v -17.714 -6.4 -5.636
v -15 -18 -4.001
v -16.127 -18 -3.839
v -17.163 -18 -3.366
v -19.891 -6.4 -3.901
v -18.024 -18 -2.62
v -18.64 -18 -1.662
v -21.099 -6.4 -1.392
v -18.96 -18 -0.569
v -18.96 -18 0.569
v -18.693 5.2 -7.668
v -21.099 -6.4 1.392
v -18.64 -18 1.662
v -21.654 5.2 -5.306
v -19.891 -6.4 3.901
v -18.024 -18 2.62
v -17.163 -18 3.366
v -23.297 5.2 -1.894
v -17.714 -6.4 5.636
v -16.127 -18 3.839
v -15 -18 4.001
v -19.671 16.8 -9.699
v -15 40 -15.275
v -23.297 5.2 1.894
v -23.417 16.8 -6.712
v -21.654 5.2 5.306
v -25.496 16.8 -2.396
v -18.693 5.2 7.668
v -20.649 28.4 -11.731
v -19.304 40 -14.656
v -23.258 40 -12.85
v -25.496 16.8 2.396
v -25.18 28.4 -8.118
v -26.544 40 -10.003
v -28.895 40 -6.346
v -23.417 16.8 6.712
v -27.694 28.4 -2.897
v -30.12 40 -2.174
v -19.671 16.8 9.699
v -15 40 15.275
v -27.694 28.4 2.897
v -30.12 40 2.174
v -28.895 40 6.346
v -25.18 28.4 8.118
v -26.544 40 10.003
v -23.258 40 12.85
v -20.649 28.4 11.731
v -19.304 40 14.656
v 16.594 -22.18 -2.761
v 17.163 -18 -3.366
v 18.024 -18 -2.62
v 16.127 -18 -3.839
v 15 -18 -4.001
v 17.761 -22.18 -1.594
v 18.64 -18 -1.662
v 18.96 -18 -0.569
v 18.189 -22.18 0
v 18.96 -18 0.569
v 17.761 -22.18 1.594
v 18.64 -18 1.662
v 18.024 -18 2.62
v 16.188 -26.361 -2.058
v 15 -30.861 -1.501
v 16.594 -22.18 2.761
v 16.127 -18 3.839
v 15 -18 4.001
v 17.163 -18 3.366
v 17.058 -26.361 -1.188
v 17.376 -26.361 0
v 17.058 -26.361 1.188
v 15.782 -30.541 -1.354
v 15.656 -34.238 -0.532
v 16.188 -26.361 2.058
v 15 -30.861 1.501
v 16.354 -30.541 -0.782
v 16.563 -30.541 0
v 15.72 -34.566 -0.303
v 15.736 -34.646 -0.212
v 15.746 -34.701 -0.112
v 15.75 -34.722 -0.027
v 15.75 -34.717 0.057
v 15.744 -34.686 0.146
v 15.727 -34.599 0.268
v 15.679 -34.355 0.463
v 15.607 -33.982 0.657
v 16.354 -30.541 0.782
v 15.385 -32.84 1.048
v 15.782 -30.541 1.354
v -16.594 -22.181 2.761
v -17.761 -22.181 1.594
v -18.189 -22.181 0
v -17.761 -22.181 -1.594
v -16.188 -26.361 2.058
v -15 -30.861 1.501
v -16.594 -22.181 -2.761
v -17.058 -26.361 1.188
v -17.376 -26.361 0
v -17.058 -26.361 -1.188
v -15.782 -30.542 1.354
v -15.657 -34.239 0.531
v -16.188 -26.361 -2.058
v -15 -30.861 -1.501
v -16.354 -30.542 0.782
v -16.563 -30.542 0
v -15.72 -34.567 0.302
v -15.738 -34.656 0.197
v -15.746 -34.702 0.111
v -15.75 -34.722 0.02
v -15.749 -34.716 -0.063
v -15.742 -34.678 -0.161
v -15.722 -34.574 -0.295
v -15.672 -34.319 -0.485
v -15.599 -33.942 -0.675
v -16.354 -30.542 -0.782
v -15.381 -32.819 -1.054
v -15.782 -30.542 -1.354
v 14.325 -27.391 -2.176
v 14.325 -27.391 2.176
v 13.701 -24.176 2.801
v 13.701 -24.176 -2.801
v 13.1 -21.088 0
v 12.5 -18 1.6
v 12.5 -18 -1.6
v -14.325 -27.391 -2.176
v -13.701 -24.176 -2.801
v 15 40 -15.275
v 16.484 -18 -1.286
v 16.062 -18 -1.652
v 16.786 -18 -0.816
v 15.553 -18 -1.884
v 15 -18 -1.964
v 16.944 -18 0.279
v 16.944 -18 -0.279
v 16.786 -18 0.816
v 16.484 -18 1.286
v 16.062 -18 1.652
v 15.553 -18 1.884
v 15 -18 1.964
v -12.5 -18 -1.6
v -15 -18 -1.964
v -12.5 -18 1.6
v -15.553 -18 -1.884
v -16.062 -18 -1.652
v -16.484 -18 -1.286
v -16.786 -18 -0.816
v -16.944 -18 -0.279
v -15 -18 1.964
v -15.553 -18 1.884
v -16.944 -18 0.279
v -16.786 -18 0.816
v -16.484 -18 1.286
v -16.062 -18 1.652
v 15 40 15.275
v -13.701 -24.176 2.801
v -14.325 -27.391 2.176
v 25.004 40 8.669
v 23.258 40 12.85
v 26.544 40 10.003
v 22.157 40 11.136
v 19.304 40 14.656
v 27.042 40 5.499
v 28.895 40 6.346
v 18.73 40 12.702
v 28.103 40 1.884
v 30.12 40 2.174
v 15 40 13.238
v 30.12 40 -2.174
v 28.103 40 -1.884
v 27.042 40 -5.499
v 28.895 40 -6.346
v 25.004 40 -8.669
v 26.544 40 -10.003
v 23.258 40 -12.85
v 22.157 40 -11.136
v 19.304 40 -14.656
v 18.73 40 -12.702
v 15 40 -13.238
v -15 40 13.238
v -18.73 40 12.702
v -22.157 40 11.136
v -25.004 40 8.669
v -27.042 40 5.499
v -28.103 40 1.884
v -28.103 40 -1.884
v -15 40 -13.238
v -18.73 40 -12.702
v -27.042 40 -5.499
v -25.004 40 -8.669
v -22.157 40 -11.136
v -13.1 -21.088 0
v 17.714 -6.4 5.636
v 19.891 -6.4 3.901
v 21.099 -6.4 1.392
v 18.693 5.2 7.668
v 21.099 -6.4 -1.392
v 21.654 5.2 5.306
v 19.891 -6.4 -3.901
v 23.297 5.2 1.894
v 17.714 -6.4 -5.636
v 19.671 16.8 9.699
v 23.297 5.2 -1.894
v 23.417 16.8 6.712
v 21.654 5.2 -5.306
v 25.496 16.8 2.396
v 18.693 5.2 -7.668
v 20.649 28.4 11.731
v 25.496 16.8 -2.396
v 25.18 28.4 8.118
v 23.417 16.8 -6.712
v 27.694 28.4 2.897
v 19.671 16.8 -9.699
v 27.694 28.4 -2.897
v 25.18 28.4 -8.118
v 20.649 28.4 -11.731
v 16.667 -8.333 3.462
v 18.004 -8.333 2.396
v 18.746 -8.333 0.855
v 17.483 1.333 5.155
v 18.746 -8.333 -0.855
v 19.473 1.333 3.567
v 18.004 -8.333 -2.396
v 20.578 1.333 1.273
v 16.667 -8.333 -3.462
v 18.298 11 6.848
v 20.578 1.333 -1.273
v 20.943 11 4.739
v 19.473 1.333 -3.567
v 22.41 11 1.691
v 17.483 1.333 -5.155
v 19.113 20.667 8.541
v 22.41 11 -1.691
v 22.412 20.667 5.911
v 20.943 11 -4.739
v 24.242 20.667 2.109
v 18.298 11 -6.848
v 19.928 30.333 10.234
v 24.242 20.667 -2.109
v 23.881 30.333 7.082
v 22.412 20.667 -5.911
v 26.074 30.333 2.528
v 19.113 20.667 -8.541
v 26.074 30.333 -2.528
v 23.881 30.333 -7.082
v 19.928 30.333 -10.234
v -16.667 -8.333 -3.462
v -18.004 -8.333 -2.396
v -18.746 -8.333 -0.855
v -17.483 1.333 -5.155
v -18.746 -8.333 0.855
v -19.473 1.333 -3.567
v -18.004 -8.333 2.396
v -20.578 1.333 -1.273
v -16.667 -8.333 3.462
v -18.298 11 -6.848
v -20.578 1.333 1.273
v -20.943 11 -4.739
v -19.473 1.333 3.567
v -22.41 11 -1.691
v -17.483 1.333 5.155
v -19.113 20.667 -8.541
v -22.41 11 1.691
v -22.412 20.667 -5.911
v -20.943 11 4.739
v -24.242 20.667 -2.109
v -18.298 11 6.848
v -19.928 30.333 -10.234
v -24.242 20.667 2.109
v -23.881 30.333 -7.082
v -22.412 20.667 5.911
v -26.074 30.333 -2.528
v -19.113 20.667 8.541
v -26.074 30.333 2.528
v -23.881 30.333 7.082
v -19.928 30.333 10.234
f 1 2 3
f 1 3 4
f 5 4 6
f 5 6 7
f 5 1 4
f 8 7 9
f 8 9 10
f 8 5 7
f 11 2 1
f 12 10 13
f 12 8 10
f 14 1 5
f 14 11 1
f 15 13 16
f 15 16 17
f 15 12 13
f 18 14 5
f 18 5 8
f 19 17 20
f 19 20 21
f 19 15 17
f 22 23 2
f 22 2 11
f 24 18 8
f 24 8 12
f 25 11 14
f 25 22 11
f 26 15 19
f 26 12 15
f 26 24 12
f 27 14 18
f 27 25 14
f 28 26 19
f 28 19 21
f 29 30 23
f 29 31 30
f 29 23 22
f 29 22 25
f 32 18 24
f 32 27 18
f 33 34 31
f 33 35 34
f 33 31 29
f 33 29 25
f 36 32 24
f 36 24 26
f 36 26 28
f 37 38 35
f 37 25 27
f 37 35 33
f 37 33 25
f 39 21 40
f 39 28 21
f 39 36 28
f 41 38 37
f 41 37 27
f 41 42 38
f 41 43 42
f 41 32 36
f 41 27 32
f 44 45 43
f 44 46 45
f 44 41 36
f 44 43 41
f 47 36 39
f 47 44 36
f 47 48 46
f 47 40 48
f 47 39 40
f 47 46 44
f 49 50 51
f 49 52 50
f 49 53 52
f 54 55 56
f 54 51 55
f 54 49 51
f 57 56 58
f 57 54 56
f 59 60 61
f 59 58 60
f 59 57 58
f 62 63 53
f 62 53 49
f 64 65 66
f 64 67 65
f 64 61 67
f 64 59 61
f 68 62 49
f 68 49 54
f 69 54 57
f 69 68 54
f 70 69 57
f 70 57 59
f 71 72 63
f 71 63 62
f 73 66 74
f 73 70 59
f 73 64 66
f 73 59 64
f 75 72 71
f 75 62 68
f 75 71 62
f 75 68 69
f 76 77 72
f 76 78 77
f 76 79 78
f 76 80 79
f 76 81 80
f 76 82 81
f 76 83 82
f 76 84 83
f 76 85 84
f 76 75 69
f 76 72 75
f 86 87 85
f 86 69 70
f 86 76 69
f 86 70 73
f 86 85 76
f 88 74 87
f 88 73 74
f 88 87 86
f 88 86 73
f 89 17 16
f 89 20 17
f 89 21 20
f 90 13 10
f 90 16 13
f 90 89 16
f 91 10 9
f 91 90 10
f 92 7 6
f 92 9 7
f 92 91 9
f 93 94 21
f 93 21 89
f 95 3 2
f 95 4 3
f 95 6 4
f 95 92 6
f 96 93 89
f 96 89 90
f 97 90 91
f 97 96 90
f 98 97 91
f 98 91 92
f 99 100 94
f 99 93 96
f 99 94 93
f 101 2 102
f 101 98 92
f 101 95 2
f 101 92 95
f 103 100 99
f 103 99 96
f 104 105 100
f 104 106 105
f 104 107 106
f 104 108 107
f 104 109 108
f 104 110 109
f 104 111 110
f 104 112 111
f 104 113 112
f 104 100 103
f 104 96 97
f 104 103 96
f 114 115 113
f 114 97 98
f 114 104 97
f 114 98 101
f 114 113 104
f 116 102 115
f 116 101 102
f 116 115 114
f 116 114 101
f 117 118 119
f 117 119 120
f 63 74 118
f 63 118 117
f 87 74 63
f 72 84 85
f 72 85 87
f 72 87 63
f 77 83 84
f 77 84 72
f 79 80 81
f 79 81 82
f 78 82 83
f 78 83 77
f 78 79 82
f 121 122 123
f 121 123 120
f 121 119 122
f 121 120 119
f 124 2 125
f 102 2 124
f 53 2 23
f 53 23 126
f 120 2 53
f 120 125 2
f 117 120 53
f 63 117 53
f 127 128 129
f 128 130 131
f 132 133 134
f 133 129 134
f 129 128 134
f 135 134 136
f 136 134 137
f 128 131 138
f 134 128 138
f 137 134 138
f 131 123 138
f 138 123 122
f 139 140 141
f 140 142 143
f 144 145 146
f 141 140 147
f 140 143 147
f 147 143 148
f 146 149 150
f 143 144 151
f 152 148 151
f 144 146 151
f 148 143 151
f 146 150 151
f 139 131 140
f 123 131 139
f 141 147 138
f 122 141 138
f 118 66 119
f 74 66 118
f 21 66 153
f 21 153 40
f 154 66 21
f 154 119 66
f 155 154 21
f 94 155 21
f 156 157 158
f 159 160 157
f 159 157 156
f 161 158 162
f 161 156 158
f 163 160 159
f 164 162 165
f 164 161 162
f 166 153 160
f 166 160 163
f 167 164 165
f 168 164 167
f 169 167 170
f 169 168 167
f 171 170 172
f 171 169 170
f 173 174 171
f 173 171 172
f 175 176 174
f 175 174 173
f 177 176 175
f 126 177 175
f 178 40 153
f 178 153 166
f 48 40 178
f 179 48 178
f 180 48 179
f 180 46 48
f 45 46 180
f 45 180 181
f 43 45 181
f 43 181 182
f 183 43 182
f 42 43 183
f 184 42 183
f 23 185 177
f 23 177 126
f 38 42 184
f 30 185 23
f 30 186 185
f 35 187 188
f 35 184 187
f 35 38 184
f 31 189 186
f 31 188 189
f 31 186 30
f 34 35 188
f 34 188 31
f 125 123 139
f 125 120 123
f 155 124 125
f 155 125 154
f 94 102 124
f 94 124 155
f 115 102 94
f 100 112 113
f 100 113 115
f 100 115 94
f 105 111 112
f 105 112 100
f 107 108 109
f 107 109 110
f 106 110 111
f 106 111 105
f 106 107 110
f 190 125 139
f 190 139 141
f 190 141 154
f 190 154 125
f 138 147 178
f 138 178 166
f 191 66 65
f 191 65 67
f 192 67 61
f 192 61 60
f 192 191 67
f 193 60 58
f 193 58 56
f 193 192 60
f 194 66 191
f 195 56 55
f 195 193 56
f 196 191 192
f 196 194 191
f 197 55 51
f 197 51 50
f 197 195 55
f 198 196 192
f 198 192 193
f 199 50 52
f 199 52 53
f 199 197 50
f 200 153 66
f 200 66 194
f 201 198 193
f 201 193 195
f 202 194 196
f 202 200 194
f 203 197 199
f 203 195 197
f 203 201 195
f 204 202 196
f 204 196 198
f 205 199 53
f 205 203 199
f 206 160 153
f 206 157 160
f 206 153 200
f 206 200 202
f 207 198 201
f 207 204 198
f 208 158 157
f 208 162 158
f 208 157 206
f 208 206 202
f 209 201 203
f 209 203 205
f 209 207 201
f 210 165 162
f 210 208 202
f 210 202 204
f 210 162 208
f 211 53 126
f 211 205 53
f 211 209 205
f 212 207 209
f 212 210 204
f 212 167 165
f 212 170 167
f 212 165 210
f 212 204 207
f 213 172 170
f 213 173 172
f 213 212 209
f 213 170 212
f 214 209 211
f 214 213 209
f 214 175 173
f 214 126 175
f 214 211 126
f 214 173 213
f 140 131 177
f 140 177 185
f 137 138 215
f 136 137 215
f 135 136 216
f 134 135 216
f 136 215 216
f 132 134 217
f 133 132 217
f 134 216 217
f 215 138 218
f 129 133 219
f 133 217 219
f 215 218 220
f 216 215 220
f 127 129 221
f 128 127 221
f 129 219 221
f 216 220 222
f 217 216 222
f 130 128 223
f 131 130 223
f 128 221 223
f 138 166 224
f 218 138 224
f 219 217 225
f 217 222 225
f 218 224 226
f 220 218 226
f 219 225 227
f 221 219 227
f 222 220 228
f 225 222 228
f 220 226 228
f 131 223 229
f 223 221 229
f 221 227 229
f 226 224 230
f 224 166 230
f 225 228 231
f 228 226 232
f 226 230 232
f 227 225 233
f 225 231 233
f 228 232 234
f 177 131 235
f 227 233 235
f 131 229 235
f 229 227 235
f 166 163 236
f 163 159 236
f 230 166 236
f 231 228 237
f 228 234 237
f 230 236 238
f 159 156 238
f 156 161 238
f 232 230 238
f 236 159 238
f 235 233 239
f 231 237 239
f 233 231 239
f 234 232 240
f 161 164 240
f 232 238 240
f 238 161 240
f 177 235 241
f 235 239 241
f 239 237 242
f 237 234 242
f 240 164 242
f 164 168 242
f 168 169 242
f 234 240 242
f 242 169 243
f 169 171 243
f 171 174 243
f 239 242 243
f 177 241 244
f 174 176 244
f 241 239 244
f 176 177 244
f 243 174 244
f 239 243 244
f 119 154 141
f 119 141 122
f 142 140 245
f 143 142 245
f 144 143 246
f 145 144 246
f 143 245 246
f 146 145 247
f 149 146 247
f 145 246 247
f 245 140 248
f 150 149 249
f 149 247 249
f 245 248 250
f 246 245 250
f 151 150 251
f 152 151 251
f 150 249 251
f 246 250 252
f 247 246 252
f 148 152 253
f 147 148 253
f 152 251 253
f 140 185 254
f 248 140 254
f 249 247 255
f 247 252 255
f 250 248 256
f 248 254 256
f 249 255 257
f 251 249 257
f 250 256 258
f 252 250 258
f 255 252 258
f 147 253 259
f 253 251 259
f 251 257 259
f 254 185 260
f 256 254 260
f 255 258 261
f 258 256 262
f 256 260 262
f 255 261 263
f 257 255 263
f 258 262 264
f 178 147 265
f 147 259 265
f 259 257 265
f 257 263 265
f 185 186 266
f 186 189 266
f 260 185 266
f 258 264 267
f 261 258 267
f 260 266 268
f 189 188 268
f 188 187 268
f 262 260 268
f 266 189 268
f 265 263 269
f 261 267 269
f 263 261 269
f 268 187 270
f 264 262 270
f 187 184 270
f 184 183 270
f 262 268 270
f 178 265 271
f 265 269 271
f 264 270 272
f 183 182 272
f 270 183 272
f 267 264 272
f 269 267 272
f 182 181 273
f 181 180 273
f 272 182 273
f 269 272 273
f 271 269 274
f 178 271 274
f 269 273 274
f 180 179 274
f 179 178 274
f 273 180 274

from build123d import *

# Parameters (mm, degrees)
BOSS_EXTRUDE1_DEPTH           = 18
BOSS_EXTRUDE1_TAPER           = 11
BOSS_EXTRUDE1_OTHER_WAY_DEPTH = 40
BOSS_EXTRUDE1_OTHER_WAY_TAPER = -11
SHELL1_T                      = -2
SKETCH2_W                     = 25
SKETCH2_H                     = 3.2
BOSS_EXTRUDE2_DEPTH           = 20
BOSS_EXTRUDE2_TAPER           = 11


with BuildPart() as part:
    # Sketch1 → Boss-Extrude1 (new body)
    with BuildSketch(Plane(origin=(0, 0, 0), x_dir=(1, 0, 0), z_dir=(0, 1, 0))):
        with BuildLine():
            ThreePointArc((-15, 7.5), (-22.5, 0), (-15, -7.5))
            Line((-15, -7.5), (15, -7.5))
            ThreePointArc((15, -7.5), (22.5, 0), (15, 7.5))
            Line((15, 7.5), (-15, 7.5))
        make_face()
    extrude(amount=-BOSS_EXTRUDE1_DEPTH, taper=BOSS_EXTRUDE1_TAPER)

    # Sketch1 → Boss-Extrude1 other way (add)
    with BuildSketch(Plane(origin=(0, 0, 0), x_dir=(1, 0, 0), z_dir=(0, 1, 0))):
        with BuildLine():
            ThreePointArc((-15, 7.5), (-22.5, 0), (-15, -7.5))
            Line((-15, -7.5), (15, -7.5))
            ThreePointArc((15, -7.5), (22.5, 0), (15, 7.5))
            Line((15, 7.5), (-15, 7.5))
        make_face()
    extrude(amount=BOSS_EXTRUDE1_OTHER_WAY_DEPTH, taper=BOSS_EXTRUDE1_OTHER_WAY_TAPER)

    # Shell1
    shell1_openings = [part.faces().sort_by_distance(p)[0] for p in [
        (0, 40, 0),
        (0, -18, 0),
    ]]
    offset(amount=SHELL1_T, openings=shell1_openings, kind=Kind.INTERSECTION)

    # Sketch2 → Boss-Extrude2 (add)
    with BuildSketch(Plane.XZ.offset(18)):
        with BuildLine():
            ThreePointArc((-15, 4.001154436), (-19.001154436, 0), (-15, -4.001154436))
            Line((-15, -4.001154436), (15, -4.001154436))
            ThreePointArc((15, -4.001154436), (19.001154436, 0), (15, 4.001154436))
            Line((15, 4.001154436), (-15, 4.001154436))
        make_face()
        Rectangle(SKETCH2_W, SKETCH2_H, mode=Mode.SUBTRACT)
    extrude(amount=BOSS_EXTRUDE2_DEPTH, taper=BOSS_EXTRUDE2_TAPER)


solid = part.part
